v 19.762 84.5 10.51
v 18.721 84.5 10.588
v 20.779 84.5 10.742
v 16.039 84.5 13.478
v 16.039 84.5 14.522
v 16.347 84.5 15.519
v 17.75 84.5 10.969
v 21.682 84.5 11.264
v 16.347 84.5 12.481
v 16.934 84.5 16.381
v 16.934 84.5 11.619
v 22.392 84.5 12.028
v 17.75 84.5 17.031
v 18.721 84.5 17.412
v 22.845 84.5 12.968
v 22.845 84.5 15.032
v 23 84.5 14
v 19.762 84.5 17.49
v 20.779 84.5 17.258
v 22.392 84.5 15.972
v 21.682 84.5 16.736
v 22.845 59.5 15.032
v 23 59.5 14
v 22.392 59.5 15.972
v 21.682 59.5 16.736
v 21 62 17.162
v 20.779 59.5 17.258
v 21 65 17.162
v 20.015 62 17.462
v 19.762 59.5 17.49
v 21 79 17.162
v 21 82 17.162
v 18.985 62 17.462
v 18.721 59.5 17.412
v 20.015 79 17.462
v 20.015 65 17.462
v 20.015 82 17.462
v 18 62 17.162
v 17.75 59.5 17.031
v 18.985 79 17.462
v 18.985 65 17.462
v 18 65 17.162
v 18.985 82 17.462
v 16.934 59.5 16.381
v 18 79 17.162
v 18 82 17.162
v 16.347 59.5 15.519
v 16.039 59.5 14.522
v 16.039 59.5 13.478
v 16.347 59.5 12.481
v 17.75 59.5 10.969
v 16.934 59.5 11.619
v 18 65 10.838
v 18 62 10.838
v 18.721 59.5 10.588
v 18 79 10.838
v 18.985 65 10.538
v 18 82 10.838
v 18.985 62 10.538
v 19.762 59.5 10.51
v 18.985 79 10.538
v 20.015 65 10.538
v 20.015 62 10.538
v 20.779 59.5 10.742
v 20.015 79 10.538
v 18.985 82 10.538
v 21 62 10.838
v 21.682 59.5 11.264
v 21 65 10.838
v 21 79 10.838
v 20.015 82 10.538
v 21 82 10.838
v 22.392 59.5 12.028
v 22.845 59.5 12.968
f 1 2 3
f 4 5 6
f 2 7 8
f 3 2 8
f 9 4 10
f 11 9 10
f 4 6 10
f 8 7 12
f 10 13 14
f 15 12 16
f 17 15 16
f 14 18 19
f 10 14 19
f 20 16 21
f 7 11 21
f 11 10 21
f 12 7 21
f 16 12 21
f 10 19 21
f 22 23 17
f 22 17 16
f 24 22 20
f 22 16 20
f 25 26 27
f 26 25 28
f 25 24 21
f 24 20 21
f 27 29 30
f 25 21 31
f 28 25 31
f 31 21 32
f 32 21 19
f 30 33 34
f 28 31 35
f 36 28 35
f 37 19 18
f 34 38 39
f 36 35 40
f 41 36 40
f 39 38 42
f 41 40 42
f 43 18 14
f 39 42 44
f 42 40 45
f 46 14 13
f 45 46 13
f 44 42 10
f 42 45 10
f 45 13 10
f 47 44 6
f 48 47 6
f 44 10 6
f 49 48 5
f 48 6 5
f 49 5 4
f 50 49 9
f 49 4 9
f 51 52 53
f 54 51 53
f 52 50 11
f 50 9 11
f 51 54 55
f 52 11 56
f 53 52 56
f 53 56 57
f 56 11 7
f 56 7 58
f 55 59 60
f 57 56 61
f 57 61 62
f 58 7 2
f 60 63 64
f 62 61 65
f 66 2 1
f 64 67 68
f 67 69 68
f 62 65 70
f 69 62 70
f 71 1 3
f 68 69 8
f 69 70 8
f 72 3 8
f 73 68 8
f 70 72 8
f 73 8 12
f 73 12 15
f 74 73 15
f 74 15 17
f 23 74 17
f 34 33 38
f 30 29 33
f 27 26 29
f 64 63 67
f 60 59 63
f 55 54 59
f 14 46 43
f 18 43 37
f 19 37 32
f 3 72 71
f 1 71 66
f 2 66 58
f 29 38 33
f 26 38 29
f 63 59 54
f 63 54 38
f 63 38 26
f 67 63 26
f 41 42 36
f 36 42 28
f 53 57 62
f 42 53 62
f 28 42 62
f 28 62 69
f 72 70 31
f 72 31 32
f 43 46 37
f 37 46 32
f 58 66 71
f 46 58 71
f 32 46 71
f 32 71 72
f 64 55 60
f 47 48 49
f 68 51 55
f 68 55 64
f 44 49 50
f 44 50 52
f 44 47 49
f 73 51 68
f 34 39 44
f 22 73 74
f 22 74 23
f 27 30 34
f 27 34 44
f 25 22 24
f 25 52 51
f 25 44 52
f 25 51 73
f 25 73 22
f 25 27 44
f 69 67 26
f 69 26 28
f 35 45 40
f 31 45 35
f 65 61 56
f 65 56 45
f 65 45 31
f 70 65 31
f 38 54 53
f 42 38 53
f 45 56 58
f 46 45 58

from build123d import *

# Parameters (mm, degrees)
BOX014_W          = 3
BOX014_H          = 3
BOX014_DEPTH      = 8
BOX013_W          = 3
BOX013_H          = 3
BOX013_DEPTH      = 8
CYLINDER009_R     = 3.5
CYLINDER009_DEPTH = 25


with BuildPart() as pivotrodbodypinhole4:
    # Box014 → Box014 (new body)
    with BuildSketch(Plane(origin=(18, 62, 10), x_dir=(1, 0, 0), z_dir=(0, 0, 1))):
        with Locations((1.5, 1.5)):
            Rectangle(BOX014_W, BOX014_H)
    extrude(amount=BOX014_DEPTH)


with BuildPart() as pivotrodpinholesright:
    # Box013 → Box013 (new body)
    with BuildSketch(Plane(origin=(18, 79, 10), x_dir=(1, 0, 0), z_dir=(0, 0, 1))):
        with Locations((1.5, 1.5)):
            Rectangle(BOX013_W, BOX013_H)
    extrude(amount=BOX013_DEPTH)

    # Fusion009: union PivotRodBodyPinhole4
    add(pivotrodbodypinhole4.part)


with BuildPart() as pivotrodright:
    # Cylinder009 → Cylinder009 (new body)
    with BuildSketch(Plane(origin=(19.5, 84.5, 14), x_dir=(1, 0, 0), z_dir=(0, -1, 0))):
        Circle(CYLINDER009_R)
    extrude(amount=CYLINDER009_DEPTH)

    # Cut007: cut PivotRodPinholesRight
    add(pivotrodpinholesright.part, mode=Mode.SUBTRACT)


solid = pivotrodright.part
